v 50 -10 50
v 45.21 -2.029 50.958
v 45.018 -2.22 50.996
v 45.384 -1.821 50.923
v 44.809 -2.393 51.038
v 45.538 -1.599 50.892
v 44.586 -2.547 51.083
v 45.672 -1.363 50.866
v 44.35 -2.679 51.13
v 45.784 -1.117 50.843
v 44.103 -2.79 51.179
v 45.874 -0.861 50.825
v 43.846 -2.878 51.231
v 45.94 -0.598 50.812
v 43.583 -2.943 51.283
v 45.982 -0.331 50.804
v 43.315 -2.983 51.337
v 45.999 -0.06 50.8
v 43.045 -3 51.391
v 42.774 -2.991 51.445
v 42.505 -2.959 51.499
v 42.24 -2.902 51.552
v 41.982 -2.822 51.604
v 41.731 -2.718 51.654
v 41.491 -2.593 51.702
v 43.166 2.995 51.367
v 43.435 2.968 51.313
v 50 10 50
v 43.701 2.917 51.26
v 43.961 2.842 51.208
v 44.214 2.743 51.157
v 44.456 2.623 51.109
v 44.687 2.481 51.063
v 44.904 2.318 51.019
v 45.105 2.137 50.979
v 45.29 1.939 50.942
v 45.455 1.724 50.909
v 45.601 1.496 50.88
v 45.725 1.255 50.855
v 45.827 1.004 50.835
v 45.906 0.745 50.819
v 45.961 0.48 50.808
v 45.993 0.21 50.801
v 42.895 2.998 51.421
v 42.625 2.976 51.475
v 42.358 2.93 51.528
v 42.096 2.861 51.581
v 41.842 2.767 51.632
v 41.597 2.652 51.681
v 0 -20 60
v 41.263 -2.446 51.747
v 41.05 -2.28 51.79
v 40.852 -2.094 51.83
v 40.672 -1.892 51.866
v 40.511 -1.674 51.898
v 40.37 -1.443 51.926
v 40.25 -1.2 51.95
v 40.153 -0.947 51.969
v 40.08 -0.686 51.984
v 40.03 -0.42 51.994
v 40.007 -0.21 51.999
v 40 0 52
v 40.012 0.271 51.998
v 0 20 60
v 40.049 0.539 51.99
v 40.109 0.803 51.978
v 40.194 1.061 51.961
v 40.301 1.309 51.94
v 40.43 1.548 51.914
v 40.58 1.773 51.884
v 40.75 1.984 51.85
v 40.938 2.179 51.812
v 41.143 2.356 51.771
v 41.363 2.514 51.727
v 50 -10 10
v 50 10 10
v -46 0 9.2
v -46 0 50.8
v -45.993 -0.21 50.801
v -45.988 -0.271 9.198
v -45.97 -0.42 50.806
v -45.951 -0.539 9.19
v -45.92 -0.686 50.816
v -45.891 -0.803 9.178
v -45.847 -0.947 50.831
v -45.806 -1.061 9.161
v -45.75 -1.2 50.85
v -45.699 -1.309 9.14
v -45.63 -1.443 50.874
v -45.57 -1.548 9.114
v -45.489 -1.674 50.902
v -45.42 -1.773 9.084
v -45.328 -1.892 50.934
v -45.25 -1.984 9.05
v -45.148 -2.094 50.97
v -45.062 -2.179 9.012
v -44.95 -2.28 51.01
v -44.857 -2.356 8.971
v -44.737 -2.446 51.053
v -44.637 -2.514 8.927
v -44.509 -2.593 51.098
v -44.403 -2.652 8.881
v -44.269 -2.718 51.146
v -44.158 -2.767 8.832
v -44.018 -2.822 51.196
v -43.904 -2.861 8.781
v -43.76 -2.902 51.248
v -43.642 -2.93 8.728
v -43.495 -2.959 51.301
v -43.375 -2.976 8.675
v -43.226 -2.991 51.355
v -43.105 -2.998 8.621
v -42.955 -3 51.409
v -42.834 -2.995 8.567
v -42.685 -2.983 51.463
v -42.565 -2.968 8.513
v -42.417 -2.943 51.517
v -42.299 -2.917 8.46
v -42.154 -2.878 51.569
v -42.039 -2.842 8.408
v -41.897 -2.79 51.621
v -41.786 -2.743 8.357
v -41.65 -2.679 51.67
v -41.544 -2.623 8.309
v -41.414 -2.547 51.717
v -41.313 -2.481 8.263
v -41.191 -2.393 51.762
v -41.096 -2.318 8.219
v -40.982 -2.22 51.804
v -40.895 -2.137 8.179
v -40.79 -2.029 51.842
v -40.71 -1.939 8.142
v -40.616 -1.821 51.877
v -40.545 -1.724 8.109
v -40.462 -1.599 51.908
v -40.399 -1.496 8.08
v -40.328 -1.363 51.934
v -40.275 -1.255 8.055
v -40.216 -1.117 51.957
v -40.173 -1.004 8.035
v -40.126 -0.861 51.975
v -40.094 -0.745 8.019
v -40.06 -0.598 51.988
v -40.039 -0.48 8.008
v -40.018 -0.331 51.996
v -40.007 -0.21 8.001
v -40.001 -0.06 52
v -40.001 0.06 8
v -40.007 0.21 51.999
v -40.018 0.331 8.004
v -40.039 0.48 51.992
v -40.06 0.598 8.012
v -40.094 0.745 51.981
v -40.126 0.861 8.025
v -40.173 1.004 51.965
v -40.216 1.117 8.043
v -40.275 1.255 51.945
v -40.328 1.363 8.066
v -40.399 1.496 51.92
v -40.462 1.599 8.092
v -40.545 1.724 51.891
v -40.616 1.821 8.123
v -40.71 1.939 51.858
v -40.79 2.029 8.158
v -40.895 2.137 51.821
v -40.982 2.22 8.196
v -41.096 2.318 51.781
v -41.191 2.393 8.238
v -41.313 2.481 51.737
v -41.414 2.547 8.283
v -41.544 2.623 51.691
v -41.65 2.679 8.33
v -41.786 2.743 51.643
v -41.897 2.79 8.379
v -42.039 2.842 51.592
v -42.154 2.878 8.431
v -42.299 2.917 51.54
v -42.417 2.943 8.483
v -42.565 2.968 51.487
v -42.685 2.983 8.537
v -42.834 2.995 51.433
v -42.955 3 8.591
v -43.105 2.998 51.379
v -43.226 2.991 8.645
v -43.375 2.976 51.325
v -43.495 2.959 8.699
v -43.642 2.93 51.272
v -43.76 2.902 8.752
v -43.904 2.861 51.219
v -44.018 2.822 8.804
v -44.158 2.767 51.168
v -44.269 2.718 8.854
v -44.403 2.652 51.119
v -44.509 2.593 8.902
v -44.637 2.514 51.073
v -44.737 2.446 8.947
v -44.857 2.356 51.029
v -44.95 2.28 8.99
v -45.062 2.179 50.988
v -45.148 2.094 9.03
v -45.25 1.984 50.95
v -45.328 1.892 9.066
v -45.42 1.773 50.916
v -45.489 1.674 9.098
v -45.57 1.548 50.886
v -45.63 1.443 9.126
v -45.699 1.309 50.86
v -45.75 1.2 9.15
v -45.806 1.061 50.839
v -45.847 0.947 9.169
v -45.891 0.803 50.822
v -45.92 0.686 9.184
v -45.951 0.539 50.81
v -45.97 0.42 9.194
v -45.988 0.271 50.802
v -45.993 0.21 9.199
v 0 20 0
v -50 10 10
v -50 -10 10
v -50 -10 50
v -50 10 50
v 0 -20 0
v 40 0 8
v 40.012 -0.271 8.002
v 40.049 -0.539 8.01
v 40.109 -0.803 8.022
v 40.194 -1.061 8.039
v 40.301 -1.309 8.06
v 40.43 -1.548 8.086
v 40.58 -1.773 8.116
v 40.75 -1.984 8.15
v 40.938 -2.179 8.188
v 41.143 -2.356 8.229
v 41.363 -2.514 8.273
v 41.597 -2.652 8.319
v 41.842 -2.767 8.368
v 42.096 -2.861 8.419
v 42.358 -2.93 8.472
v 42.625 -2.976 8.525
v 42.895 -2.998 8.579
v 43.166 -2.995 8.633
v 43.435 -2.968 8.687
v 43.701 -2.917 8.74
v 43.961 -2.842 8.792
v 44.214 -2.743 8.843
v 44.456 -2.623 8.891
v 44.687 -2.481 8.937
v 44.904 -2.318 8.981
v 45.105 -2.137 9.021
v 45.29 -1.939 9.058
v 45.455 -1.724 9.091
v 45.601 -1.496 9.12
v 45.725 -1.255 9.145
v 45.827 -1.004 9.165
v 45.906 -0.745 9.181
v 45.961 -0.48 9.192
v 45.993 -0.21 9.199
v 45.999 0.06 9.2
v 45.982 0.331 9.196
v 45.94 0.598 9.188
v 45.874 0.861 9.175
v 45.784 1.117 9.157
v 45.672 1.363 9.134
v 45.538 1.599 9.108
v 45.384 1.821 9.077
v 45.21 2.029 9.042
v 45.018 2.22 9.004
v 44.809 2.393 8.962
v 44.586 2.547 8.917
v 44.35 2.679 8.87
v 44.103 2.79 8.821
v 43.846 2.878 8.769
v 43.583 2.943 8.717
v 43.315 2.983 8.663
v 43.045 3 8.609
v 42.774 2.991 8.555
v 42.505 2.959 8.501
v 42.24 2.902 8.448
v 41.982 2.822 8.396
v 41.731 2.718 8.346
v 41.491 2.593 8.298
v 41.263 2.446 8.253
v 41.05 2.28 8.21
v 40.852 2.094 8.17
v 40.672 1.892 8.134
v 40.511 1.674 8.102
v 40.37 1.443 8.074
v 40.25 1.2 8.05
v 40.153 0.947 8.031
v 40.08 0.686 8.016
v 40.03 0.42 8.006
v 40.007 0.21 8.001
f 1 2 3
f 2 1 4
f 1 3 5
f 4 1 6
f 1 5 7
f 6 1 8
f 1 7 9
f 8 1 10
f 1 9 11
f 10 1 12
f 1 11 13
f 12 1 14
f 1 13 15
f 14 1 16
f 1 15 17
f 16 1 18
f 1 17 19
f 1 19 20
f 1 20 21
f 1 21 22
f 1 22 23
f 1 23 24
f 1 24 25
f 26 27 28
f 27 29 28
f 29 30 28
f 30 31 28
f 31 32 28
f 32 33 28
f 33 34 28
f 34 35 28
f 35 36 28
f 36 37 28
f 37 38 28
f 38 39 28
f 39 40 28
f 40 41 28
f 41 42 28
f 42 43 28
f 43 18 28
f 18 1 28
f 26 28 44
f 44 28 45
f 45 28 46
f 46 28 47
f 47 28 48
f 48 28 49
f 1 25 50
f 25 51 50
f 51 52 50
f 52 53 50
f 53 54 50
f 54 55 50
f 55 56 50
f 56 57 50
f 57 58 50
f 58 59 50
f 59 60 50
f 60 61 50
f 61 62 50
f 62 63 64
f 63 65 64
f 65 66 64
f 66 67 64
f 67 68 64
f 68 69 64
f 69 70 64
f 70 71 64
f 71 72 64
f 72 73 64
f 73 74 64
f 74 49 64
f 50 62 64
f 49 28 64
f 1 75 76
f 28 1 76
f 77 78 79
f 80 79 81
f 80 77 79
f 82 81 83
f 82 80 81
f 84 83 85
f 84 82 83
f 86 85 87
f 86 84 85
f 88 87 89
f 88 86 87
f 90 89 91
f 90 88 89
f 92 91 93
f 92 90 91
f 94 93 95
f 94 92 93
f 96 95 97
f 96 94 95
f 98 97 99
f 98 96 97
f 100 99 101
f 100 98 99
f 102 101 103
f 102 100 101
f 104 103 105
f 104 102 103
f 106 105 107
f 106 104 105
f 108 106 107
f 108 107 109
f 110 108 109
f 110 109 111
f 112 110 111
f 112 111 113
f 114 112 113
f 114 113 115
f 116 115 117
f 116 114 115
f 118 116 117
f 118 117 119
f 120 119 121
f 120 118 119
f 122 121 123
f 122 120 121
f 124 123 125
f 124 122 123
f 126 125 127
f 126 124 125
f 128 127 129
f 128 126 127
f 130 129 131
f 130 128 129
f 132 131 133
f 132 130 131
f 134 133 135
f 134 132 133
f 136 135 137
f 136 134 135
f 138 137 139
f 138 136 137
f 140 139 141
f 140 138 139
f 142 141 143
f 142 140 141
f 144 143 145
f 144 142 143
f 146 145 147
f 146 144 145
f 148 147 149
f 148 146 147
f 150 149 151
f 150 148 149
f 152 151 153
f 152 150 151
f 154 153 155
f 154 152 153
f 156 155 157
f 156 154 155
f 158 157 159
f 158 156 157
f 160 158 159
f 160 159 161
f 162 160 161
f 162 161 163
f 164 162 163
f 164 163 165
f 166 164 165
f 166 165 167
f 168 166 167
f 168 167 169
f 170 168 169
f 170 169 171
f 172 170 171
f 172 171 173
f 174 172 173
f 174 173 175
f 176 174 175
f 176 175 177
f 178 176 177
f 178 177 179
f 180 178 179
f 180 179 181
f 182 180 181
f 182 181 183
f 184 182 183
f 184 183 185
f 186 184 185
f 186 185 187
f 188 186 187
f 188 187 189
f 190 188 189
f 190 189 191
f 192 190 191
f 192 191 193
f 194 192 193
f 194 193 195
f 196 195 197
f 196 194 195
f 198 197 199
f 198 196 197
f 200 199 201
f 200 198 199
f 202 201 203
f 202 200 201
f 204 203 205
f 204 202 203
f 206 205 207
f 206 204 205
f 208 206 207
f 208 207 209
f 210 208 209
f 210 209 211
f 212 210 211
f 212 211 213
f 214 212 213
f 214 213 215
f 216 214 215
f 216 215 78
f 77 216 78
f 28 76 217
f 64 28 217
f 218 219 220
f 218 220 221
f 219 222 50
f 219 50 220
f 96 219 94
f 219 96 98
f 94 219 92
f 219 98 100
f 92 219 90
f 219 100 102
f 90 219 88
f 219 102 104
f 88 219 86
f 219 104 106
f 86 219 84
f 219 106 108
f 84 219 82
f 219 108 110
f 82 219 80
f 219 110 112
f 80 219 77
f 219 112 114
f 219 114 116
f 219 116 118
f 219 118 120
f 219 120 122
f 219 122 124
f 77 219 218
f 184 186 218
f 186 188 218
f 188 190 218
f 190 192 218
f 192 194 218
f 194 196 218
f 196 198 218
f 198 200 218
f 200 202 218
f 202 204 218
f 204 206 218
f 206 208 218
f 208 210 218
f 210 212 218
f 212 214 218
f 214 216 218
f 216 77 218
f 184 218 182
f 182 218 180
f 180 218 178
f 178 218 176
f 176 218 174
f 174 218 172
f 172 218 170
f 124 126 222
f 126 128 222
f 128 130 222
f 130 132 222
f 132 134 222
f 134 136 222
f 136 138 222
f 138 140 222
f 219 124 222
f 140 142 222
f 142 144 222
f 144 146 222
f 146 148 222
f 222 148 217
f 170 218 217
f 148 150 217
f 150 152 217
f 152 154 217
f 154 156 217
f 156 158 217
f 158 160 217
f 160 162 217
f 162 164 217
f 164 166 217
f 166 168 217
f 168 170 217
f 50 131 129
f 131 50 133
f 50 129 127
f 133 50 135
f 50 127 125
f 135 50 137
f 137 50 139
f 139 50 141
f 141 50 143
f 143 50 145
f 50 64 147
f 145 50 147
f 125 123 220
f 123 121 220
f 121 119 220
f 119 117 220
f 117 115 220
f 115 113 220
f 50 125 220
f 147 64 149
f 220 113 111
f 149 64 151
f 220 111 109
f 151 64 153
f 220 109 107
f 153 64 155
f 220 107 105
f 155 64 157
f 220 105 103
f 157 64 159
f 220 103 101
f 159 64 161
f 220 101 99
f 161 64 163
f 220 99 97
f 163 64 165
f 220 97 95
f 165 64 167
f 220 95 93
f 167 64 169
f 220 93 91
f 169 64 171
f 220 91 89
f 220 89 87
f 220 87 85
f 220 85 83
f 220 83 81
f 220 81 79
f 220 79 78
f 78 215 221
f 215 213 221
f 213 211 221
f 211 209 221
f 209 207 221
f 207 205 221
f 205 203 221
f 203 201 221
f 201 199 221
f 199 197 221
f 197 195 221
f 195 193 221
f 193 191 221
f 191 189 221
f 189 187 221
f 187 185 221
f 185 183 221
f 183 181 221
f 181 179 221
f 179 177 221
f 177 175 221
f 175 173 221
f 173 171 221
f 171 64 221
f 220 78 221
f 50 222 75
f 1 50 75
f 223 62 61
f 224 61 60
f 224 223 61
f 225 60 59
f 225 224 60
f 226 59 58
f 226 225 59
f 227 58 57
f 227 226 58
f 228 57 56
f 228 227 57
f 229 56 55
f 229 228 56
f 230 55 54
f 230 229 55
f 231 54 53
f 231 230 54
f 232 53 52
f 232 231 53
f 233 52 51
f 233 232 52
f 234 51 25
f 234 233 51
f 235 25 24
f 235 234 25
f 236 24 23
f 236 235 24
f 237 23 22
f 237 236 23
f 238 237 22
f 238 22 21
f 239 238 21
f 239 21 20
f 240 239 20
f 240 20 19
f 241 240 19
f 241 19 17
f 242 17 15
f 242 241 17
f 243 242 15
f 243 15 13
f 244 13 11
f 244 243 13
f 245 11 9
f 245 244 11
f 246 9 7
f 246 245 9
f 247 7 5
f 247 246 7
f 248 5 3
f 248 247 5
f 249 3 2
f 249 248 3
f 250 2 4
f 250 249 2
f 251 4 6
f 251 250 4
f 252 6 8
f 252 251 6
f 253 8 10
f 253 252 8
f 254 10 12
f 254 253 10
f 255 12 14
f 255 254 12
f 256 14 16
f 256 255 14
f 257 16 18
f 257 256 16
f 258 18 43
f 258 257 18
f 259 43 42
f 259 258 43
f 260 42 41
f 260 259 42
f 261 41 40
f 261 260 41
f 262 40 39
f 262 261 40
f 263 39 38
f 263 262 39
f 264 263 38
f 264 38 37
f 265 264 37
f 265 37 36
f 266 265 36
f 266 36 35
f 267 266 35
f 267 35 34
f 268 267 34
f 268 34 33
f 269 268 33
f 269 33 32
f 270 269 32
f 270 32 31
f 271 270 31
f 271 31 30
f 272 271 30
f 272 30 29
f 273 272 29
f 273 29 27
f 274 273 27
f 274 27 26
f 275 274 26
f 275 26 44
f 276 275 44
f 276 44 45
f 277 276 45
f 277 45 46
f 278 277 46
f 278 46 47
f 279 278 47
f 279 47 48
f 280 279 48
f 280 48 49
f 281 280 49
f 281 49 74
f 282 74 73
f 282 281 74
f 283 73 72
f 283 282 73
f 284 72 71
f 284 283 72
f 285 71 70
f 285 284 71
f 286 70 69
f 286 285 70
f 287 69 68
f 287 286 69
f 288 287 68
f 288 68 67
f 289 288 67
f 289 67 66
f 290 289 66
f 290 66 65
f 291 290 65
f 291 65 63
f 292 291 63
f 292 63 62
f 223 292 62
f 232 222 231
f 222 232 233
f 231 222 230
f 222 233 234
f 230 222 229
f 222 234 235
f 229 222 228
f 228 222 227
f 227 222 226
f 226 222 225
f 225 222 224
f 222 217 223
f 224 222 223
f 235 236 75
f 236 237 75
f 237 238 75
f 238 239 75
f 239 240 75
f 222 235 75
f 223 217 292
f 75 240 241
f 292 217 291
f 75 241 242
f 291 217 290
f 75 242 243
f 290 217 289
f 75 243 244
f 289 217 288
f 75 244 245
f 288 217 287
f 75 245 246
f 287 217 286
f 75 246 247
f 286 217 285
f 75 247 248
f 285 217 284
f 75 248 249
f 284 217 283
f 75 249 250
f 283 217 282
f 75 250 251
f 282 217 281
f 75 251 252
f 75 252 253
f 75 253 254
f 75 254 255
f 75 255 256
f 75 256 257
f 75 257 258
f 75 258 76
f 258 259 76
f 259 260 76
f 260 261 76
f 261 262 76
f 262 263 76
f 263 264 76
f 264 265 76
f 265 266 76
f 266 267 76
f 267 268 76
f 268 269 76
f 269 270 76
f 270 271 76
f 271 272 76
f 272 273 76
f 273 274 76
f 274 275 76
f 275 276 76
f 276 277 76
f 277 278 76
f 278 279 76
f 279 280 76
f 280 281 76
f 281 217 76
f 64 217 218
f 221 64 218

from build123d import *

# Parameters (mm, degrees)
SKETCH1_W           = 100
SKETCH1_H           = 40
BOSS_EXTRUDE1_DEPTH = 60
CUT_EXTRUDE1_DEPTH  = 40
CUT_EXTRUDE2_DEPTH  = 81.622577483
SKETCH5_R           = 3
CUT_EXTRUDE3_DEPTH  = 81.622577483


with BuildPart() as part:
    # Sketch1 → Boss-Extrude1 (new body)
    with BuildSketch(Plane.XY):
        Rectangle(SKETCH1_W, SKETCH1_H)
    extrude(amount=BOSS_EXTRUDE1_DEPTH)

    # Sketch2 → Cut-Extrude1 (cut)
    with BuildSketch(Plane(origin=(0, 20, 0), x_dir=(1, 0, 0), z_dir=(0, 1, 0))):
        Polygon((0, -60), (-50, -50), (-50, -60), align=None)
        Polygon((50, -50), (0, -60), (50, -60), align=None)
        Polygon((50, 0), (0, 0), (50, -10), align=None)
        Polygon((-50, 0), (-50, -10), (0, 0), align=None)
    extrude(amount=-CUT_EXTRUDE1_DEPTH, mode=Mode.SUBTRACT)

    # Sketch4 → Cut-Extrude2 (cut, through all)
    with BuildSketch(Plane.XY):
        Polygon((-50, 20), (0, 20), (-50, 10), align=None)
        Polygon((50, 20), (50, 10), (0, 20), align=None)
        Polygon((50, -20), (0, -20), (50, -10), align=None)
        Polygon((-50, -10), (-50, -20), (0, -20), align=None)
    extrude(amount=CUT_EXTRUDE2_DEPTH, mode=Mode.SUBTRACT)

    # Sketch5 → Cut-Extrude3 (cut, through all)
    with BuildSketch(Plane.XY):
        with Locations(Location((-43, 0, 0), (0, 0, 180))):
            Circle(SKETCH5_R)
        with Locations(Location((43, 0, 0), (0, 0, 180))):
            Circle(SKETCH5_R)
    extrude(amount=CUT_EXTRUDE3_DEPTH, mode=Mode.SUBTRACT)


solid = part.part
